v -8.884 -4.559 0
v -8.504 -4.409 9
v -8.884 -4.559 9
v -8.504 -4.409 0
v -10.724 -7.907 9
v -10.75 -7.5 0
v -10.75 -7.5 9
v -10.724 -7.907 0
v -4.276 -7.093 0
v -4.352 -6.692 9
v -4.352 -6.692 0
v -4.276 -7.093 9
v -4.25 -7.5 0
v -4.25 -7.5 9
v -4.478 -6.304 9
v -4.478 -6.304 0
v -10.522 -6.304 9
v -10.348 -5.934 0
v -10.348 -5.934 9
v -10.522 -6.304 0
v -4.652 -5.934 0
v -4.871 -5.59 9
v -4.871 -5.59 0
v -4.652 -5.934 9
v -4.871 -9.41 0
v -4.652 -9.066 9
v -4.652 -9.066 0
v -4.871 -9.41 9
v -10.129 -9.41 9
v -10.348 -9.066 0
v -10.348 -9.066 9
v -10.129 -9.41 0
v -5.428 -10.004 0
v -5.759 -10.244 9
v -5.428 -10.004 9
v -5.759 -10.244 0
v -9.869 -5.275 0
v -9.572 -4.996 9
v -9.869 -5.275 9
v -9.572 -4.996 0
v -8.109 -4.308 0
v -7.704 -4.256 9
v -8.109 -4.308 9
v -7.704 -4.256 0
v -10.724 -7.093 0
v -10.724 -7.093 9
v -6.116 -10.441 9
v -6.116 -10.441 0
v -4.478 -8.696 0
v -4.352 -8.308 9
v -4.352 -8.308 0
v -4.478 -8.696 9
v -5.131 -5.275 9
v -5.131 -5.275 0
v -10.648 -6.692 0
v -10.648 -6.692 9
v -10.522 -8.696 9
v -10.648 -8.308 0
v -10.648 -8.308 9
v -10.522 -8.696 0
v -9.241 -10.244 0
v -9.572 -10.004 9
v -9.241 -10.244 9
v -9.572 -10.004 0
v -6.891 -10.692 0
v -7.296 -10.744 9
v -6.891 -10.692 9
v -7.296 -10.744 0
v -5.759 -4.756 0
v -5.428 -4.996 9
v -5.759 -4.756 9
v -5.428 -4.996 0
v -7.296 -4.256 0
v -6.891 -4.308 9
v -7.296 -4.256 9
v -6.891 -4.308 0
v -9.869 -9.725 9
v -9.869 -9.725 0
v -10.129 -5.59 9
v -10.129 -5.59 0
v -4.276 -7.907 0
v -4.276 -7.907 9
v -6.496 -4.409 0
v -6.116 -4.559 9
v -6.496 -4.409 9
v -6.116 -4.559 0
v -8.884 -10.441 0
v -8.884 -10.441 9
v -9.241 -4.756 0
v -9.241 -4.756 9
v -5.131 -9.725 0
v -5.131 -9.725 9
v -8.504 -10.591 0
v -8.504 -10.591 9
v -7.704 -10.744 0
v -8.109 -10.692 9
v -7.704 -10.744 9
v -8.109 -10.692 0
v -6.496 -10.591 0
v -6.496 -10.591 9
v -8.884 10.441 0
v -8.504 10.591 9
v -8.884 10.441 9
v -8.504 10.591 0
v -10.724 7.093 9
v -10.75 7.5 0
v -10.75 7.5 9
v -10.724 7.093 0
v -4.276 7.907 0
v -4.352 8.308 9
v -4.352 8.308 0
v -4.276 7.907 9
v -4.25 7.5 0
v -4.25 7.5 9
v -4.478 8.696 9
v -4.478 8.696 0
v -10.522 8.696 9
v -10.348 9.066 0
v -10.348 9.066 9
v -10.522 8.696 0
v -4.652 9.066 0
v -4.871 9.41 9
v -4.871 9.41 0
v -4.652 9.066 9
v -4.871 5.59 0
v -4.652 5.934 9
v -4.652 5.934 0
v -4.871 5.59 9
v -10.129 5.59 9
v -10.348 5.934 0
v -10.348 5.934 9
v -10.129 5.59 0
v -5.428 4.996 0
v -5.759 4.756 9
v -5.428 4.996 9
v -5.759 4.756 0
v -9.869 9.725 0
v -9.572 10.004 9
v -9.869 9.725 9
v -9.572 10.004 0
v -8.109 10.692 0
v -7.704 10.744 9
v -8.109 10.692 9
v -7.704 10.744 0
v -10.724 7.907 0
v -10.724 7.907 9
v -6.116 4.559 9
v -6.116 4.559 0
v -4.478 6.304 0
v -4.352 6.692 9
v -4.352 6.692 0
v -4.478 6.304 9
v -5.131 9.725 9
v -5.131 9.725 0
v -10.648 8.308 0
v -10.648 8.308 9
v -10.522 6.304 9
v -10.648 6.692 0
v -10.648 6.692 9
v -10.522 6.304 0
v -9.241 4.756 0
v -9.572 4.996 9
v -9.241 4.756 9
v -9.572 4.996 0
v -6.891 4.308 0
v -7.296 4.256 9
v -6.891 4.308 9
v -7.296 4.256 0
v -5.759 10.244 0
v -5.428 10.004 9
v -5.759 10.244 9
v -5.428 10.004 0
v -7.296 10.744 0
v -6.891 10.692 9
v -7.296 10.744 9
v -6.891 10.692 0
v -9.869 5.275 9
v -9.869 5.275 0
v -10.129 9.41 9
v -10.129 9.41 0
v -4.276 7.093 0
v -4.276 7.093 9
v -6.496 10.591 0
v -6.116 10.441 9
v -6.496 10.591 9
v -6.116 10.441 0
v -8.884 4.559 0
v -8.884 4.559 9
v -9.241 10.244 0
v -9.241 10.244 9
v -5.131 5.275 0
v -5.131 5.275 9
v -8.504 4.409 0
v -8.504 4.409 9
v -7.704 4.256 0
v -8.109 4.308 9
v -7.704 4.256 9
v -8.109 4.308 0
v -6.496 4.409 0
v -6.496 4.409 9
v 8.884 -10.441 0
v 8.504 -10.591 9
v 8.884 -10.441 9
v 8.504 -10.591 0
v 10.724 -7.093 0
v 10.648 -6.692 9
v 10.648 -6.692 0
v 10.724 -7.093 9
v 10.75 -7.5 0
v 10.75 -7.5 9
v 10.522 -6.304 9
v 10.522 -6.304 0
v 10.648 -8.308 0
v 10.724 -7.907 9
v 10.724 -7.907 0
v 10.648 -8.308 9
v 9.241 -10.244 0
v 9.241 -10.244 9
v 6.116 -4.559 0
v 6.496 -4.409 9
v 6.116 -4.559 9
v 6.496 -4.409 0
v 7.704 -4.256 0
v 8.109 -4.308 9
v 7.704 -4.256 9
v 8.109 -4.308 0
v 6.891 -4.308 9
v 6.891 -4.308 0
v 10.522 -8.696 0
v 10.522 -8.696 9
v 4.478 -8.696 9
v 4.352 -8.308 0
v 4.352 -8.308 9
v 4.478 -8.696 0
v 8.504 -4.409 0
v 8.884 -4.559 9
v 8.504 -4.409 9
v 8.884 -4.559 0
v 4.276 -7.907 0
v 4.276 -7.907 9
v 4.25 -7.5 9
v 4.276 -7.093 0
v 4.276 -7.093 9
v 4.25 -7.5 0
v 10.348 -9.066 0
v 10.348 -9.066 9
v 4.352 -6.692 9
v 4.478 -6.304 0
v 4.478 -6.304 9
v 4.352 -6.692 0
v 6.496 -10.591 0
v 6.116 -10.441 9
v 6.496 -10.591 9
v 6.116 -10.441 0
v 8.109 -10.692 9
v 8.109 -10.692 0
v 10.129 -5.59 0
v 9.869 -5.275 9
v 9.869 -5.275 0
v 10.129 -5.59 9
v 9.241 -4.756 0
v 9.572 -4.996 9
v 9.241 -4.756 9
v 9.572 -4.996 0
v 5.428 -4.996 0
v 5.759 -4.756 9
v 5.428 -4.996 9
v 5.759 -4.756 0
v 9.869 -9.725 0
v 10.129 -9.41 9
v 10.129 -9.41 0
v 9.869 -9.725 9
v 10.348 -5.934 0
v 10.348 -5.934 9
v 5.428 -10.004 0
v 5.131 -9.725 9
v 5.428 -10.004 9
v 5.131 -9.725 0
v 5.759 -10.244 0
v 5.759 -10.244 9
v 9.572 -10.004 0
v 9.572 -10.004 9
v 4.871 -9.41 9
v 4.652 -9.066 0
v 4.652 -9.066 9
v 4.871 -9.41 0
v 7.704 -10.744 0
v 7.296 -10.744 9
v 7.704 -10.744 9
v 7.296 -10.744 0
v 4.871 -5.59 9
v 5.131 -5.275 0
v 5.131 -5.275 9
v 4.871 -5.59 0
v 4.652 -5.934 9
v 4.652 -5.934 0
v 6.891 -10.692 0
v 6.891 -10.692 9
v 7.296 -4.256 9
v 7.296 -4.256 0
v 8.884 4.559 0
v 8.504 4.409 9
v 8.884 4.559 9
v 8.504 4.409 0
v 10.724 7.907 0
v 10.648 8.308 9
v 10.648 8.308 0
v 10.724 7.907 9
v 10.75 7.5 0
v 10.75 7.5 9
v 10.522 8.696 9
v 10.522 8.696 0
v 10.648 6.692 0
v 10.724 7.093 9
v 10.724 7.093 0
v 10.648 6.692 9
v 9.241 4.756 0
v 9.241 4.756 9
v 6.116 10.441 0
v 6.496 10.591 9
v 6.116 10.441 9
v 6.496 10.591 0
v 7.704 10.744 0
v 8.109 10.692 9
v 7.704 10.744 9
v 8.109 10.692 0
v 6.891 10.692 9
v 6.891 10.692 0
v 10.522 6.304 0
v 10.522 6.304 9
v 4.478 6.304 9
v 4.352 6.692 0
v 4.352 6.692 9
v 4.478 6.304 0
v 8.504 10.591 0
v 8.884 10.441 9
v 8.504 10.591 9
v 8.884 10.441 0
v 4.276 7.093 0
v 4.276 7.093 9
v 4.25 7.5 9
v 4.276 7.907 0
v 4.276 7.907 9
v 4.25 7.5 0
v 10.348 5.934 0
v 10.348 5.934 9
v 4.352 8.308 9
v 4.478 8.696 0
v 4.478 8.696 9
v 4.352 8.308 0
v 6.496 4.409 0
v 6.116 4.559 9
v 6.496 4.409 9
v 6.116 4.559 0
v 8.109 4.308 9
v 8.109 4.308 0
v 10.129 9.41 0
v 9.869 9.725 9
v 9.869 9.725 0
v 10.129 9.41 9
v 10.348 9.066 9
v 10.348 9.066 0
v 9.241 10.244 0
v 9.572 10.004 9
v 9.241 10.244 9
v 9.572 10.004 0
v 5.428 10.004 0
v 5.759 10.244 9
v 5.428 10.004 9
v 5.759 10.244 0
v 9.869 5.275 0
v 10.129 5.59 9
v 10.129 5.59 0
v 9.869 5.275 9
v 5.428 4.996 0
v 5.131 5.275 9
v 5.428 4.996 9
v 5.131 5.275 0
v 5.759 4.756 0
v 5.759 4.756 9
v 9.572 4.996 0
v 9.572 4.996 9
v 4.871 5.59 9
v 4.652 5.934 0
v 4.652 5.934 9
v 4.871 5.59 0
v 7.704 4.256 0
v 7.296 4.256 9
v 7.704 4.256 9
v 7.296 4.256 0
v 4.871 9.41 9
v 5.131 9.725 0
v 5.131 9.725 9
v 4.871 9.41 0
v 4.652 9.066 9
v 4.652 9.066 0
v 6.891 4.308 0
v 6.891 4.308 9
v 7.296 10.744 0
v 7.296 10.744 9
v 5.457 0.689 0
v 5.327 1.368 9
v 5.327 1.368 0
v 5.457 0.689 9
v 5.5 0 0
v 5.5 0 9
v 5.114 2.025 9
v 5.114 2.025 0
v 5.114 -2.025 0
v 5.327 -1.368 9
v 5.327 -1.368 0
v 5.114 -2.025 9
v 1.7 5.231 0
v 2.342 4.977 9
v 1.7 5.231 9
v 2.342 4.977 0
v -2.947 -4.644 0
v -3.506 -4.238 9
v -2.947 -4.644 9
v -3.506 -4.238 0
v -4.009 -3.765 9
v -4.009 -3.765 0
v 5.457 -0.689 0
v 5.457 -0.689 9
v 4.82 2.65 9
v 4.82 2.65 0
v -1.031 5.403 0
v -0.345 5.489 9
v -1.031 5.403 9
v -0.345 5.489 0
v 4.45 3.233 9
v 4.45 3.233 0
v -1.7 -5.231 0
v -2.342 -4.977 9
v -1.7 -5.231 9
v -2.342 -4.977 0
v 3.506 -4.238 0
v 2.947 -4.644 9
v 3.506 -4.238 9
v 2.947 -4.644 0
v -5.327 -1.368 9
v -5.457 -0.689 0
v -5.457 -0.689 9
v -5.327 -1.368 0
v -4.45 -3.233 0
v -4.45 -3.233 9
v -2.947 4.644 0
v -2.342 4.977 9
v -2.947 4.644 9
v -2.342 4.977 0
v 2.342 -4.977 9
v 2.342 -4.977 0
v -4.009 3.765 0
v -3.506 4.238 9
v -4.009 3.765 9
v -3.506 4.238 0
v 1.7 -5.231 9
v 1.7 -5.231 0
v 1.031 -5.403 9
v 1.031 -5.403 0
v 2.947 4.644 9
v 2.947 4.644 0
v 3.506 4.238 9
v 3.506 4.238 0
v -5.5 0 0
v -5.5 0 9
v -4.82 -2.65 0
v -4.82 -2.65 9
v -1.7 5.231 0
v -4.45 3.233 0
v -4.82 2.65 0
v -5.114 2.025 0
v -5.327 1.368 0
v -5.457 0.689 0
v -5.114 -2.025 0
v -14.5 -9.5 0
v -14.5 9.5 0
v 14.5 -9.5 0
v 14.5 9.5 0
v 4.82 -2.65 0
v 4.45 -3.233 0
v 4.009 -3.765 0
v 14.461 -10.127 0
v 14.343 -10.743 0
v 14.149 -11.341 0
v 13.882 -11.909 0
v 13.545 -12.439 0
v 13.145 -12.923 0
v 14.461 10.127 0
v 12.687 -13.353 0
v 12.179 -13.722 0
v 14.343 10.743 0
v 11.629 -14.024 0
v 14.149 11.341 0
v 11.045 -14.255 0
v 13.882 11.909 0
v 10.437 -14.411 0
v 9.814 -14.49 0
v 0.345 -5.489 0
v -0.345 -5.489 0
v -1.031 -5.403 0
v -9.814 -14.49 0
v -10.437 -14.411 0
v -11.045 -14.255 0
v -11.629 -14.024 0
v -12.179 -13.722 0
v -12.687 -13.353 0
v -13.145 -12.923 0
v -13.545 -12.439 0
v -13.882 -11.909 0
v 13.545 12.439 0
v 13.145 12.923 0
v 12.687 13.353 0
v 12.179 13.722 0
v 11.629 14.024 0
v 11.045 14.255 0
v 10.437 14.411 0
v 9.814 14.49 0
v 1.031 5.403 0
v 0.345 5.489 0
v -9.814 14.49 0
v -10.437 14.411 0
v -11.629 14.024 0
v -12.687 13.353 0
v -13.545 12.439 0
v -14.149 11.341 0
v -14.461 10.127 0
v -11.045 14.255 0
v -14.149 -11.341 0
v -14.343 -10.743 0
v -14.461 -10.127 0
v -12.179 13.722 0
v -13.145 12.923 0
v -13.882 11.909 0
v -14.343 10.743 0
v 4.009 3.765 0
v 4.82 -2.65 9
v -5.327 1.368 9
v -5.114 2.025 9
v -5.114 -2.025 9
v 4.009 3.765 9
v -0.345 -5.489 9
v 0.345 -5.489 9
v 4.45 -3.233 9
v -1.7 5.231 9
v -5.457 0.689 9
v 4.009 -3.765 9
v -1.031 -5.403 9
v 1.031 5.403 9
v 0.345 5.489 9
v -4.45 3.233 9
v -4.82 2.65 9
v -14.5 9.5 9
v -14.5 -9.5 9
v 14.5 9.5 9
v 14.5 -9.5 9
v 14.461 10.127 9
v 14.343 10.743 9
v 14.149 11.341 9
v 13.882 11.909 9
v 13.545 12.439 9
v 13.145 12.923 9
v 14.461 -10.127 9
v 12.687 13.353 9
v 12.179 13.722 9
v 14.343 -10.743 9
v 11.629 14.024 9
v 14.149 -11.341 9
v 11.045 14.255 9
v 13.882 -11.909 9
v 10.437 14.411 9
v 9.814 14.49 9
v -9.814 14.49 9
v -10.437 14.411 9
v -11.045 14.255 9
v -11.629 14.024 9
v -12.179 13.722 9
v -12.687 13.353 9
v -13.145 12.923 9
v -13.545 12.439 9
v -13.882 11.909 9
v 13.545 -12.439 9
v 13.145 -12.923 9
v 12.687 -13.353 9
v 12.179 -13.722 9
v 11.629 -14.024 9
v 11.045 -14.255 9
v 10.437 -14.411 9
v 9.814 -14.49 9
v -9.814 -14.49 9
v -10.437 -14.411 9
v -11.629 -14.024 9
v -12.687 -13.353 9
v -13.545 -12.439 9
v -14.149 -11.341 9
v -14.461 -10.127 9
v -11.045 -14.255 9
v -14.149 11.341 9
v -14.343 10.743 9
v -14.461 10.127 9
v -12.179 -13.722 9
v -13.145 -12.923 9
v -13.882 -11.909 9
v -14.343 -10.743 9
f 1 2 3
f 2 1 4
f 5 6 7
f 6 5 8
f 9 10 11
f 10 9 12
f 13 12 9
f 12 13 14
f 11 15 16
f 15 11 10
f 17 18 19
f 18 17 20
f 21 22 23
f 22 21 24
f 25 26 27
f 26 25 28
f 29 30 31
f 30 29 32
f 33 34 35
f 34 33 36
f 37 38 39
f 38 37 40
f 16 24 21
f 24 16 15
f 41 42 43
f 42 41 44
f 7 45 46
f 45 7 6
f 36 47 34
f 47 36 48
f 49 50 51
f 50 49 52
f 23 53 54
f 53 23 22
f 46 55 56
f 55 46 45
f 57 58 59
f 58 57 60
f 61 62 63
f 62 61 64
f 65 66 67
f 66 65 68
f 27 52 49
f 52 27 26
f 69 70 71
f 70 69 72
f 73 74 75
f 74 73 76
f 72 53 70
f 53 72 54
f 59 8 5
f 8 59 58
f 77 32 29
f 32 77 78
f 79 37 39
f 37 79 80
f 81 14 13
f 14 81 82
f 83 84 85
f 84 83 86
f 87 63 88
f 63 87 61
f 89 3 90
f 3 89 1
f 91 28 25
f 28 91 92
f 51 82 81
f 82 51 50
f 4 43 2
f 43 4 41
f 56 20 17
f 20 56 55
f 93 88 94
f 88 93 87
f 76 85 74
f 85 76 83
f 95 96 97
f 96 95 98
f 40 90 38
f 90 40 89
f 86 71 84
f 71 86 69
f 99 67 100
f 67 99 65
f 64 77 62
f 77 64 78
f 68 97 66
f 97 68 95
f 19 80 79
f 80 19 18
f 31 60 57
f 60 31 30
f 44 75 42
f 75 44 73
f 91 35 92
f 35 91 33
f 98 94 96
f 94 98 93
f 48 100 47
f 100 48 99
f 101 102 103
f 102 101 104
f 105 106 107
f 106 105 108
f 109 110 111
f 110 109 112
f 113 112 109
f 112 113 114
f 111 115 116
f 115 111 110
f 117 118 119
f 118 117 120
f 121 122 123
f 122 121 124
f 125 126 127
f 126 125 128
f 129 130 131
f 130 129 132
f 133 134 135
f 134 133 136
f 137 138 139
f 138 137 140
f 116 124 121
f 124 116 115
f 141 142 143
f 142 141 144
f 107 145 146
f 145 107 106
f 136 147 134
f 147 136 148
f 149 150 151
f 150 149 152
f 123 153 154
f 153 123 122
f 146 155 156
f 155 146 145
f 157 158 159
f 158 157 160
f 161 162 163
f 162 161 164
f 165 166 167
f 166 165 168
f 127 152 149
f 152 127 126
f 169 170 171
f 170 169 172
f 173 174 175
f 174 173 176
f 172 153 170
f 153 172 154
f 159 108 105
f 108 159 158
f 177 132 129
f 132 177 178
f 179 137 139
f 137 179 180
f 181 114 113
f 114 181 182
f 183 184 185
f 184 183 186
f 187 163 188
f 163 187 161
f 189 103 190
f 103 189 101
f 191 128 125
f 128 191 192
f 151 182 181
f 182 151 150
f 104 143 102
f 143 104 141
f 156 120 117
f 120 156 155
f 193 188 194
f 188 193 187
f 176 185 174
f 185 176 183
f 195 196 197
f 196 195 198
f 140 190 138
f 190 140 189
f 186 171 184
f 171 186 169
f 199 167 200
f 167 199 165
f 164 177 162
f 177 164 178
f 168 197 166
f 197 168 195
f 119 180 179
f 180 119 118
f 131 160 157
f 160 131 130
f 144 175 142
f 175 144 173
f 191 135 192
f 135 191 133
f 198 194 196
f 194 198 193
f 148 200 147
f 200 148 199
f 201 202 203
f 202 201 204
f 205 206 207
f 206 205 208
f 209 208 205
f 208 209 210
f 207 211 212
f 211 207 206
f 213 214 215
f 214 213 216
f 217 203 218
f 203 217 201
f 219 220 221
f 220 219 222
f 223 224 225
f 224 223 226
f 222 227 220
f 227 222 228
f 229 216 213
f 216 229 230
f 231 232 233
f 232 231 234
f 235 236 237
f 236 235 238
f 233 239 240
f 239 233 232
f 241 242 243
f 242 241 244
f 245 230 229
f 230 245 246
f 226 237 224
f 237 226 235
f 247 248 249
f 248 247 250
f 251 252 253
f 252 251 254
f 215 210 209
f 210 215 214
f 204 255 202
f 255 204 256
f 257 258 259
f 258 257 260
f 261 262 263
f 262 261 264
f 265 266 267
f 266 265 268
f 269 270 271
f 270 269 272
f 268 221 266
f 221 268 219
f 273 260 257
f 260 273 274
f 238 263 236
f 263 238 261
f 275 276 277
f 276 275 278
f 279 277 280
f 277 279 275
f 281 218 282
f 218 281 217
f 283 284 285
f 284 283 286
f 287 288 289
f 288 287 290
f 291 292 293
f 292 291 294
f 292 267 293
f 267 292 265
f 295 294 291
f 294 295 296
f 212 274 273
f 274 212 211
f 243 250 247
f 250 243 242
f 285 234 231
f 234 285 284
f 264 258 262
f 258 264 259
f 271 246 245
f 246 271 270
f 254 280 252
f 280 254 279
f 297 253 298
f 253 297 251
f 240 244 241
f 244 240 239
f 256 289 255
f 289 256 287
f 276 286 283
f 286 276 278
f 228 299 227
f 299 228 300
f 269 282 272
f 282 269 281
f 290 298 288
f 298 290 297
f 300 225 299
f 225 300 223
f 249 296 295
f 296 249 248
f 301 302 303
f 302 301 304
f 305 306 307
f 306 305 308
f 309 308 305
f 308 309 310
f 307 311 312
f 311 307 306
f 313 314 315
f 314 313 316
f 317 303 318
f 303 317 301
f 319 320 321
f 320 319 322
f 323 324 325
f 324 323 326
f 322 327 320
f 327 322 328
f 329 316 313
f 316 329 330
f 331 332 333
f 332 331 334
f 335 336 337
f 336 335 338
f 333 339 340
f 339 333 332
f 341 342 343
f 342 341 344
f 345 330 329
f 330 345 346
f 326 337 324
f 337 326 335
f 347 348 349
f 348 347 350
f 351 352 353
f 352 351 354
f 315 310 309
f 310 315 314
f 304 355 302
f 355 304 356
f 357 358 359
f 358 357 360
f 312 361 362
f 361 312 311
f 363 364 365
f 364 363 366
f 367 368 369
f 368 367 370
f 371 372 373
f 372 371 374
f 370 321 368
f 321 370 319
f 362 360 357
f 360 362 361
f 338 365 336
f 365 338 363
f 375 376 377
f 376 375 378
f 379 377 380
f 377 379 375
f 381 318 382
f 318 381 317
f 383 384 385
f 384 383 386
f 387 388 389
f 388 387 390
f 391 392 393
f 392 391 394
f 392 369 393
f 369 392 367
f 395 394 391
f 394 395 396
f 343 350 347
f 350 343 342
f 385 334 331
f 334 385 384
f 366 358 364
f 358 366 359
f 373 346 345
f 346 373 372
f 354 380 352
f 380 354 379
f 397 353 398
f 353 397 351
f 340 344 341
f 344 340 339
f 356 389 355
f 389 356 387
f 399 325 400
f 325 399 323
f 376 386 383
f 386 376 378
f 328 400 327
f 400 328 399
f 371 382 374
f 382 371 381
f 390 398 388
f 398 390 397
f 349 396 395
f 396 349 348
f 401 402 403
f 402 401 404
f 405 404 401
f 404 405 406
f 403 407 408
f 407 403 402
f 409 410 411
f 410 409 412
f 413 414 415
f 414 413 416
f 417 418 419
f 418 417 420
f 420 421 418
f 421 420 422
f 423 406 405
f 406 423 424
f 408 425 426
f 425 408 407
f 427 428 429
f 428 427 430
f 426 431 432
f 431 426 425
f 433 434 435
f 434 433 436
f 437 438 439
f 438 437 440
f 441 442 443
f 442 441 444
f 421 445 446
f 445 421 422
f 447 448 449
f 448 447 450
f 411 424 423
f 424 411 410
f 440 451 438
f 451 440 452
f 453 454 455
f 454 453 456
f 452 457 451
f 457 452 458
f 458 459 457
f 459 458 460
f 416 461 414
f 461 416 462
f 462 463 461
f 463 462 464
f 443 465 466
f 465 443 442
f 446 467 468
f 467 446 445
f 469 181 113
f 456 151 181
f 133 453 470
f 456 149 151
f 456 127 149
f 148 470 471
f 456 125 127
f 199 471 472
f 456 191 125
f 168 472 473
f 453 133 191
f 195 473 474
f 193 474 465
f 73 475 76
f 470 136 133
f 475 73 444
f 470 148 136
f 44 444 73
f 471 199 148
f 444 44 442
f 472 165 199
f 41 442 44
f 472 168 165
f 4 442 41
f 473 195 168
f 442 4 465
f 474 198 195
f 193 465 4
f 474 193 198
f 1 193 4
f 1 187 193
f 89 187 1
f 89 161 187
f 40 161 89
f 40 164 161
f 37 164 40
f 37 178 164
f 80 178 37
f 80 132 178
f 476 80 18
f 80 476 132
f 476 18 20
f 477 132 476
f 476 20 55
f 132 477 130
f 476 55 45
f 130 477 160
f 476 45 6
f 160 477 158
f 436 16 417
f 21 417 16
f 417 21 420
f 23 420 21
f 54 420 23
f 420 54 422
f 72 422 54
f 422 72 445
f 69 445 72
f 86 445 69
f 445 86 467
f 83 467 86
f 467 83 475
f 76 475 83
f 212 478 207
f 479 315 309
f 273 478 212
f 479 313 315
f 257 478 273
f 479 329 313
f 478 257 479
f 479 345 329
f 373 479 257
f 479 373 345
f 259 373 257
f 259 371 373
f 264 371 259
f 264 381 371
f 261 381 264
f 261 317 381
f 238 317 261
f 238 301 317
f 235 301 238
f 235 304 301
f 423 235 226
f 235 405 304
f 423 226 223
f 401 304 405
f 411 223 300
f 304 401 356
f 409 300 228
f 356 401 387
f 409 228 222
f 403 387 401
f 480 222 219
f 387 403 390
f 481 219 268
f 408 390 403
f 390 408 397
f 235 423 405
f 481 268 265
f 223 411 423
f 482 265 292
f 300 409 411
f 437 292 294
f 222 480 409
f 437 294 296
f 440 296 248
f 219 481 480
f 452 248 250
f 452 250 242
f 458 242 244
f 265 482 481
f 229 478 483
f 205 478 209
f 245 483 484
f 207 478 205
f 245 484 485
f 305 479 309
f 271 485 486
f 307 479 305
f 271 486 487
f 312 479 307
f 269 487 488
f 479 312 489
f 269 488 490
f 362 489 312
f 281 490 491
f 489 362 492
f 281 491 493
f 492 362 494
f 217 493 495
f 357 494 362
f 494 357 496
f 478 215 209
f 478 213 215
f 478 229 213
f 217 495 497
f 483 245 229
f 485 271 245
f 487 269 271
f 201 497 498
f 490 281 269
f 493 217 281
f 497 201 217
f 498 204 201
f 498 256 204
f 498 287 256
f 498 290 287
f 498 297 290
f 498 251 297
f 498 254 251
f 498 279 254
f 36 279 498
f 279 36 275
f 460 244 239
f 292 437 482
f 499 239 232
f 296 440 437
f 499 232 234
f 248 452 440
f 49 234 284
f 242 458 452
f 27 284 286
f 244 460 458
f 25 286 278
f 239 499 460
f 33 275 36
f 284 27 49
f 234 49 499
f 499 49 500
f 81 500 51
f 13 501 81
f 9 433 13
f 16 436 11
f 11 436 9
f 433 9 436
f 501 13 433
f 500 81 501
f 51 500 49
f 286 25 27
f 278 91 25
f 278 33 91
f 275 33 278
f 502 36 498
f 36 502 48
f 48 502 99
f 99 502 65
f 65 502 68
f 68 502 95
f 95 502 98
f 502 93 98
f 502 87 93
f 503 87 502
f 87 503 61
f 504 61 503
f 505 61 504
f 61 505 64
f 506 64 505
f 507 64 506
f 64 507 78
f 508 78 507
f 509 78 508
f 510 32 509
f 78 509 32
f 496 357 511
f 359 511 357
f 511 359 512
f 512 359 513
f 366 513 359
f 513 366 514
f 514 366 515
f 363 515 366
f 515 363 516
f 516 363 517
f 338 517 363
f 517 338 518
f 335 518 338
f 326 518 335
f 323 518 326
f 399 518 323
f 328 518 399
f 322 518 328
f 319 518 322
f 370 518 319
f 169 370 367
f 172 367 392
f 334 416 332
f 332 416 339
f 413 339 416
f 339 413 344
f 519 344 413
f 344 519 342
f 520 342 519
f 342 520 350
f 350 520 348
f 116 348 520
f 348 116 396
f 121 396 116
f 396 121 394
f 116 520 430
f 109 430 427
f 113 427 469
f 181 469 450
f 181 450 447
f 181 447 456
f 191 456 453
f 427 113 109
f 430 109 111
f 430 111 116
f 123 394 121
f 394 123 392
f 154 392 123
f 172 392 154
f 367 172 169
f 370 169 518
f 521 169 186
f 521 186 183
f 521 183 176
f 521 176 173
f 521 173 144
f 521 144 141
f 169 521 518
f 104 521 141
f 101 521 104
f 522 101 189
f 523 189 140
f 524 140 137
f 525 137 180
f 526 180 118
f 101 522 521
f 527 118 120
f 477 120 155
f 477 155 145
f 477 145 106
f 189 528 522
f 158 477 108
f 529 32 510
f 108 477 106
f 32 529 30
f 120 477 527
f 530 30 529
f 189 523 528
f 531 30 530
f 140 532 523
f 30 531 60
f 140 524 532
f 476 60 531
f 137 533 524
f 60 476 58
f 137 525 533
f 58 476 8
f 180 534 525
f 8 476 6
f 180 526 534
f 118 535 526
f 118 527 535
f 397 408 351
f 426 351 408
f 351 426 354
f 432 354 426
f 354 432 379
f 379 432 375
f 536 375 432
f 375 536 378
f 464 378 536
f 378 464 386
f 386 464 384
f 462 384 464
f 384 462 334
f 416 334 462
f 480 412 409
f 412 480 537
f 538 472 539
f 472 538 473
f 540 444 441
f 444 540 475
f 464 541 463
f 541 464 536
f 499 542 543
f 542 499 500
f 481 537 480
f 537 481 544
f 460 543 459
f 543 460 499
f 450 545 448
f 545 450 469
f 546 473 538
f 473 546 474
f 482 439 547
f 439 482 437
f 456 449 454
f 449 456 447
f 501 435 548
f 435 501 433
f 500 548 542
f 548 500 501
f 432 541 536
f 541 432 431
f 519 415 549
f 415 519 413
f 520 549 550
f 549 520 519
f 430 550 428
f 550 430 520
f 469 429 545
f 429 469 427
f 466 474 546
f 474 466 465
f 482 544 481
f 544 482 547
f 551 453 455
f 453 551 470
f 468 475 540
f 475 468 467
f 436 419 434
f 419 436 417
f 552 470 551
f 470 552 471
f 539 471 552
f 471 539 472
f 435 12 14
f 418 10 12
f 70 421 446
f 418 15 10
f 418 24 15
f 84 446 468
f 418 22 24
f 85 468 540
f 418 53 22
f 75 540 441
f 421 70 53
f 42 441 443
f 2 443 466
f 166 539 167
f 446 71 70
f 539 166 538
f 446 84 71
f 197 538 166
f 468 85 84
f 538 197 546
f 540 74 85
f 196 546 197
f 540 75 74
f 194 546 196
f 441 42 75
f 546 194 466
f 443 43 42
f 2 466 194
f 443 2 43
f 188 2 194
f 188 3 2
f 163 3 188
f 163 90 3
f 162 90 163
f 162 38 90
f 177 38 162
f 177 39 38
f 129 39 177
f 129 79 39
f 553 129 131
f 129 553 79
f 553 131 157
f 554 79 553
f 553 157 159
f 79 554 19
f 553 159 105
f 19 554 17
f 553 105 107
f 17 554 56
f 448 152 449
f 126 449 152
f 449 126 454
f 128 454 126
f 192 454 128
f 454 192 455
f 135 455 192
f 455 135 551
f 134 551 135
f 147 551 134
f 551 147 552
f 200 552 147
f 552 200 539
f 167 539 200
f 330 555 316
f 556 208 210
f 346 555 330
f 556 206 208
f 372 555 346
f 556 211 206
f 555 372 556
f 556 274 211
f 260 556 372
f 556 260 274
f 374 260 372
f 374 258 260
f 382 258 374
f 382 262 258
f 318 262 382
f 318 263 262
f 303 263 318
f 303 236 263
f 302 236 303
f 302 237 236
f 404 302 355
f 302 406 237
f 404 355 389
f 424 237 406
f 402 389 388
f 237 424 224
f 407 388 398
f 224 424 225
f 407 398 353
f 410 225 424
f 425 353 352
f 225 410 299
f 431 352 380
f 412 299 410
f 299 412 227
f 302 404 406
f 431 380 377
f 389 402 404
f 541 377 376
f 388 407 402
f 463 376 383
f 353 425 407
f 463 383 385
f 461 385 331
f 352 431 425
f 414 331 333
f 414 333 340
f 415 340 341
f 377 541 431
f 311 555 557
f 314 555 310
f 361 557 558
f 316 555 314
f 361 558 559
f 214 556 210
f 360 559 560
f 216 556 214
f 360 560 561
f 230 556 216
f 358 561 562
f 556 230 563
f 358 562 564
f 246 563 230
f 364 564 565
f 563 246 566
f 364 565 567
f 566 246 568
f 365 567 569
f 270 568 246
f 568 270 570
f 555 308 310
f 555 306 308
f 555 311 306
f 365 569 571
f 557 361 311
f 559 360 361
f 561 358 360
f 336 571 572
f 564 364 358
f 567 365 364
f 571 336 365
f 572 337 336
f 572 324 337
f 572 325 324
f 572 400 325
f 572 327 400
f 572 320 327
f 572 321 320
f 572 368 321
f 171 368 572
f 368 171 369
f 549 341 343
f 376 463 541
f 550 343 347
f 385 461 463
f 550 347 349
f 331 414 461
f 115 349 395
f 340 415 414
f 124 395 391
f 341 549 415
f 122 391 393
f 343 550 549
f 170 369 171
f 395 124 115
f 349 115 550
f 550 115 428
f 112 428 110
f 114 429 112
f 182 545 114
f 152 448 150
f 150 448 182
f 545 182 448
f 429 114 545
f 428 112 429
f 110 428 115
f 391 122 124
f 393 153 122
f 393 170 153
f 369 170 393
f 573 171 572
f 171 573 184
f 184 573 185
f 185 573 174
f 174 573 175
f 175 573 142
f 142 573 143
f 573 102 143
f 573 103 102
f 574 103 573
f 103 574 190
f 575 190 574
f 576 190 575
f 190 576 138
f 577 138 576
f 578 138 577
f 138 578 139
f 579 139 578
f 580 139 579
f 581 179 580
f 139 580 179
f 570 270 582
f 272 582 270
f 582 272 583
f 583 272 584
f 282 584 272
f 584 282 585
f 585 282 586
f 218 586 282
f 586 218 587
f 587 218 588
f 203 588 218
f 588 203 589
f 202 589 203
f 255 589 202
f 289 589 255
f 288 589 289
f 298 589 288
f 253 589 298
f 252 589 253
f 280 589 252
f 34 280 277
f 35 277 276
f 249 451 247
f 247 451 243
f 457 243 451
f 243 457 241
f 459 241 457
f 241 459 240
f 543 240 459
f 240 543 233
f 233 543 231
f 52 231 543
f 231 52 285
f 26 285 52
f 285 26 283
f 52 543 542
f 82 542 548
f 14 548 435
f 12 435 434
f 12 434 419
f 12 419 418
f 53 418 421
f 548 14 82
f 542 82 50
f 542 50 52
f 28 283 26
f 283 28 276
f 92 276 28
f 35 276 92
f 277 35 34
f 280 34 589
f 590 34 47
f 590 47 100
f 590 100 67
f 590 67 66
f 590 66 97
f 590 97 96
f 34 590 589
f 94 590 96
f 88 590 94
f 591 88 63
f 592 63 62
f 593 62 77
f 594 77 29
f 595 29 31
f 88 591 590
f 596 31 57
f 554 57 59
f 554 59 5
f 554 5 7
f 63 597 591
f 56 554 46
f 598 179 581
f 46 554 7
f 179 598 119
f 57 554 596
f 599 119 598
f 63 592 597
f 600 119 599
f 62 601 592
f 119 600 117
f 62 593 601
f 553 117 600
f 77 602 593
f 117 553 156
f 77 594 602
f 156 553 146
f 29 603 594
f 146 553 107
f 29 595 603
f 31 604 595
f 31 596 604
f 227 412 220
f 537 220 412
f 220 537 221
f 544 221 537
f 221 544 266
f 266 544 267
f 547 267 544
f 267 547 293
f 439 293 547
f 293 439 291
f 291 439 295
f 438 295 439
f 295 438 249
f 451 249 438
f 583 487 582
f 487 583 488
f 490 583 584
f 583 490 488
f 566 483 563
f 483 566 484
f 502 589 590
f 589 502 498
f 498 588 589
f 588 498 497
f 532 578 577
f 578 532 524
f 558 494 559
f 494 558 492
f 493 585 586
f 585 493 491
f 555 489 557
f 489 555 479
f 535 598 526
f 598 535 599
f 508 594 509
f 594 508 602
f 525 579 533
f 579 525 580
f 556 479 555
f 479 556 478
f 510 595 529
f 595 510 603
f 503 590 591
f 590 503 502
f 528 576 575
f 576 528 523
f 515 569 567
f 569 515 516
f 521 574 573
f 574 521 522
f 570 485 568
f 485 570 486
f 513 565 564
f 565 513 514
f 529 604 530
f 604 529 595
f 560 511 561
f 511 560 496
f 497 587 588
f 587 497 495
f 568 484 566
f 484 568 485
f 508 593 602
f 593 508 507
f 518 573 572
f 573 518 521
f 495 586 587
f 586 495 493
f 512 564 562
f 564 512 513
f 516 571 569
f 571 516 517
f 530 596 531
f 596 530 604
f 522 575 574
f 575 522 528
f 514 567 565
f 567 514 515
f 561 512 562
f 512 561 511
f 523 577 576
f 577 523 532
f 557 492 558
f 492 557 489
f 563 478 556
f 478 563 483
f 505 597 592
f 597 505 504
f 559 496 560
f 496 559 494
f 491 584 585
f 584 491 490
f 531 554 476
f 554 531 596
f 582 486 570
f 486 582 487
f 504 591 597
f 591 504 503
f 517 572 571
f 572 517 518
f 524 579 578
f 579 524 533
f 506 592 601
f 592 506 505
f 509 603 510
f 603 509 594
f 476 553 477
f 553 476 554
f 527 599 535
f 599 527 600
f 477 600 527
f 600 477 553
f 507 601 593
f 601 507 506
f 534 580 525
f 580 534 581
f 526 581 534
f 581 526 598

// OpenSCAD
$fn = 50;

difference() {
	union() {
		hull() {
			translate(v = [-9.5, 9.5, 0]) {
				cylinder(h = 9, r = 5);
			}
			translate(v = [9.5, 9.5, 0]) {
				cylinder(h = 9, r = 5);
			}
			translate(v = [-9.5, -9.5, 0]) {
				cylinder(h = 9, r = 5);
			}
			translate(v = [9.5, -9.5, 0]) {
				cylinder(h = 9, r = 5);
			}
		}
	}
	union() {
		translate(v = [-7.5, -7.5, -100.0]) {
			cylinder(h = 200, r = 3.25);
		}
		translate(v = [-7.5, 7.5, -100.0]) {
			cylinder(h = 200, r = 3.25);
		}
		translate(v = [7.5, -7.5, -100.0]) {
			cylinder(h = 200, r = 3.25);
		}
		translate(v = [7.5, 7.5, -100.0]) {
			cylinder(h = 200, r = 3.25);
		}
		translate(v = [-7.5, -7.5, -100.0]) {
			cylinder(h = 200, r = 1.8);
		}
		translate(v = [-7.5, 7.5, -100.0]) {
			cylinder(h = 200, r = 1.8);
		}
		translate(v = [7.5, -7.5, -100.0]) {
			cylinder(h = 200, r = 1.8);
		}
		translate(v = [7.5, 7.5, -100.0]) {
			cylinder(h = 200, r = 1.8);
		}
		cylinder(h = 9, r = 5.5);
	}
}
